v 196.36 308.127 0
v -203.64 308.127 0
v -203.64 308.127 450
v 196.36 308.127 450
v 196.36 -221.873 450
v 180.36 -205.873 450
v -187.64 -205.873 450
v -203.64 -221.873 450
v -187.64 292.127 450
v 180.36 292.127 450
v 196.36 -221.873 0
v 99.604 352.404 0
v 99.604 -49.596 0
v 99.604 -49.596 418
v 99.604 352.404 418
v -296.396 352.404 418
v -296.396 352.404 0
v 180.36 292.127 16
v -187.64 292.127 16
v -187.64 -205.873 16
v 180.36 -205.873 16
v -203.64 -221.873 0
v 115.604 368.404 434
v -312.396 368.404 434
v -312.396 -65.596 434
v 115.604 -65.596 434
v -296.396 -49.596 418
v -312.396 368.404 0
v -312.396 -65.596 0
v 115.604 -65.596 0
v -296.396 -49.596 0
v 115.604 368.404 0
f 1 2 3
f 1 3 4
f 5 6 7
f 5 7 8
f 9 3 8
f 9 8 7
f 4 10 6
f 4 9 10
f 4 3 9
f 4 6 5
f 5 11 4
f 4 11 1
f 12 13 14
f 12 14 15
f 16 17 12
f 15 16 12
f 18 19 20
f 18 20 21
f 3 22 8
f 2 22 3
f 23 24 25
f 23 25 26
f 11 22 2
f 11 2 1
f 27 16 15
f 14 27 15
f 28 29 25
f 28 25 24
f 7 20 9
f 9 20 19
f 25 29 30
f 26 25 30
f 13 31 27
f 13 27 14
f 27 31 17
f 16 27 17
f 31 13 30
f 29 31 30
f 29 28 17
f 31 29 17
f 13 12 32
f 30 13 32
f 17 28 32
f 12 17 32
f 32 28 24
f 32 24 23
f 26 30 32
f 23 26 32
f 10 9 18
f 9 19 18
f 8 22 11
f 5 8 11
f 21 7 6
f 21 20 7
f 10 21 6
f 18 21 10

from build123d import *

# Parameters (mm, degrees)
F0_W     = 400
F0_H     = 530
F2_DEPTH = 450
F3_T     = -16
F1_W     = 428
F1_H     = 434
F4_DEPTH = 434
F5_T     = -16


with BuildPart() as f2:
    # F0 (on Top) → F2 (new body)
    with BuildSketch(Plane.XY):
        with Locations((-3.6404564339, 43.1266156584)):
            Rectangle(F0_W, F0_H)
    extrude(amount=F2_DEPTH)

    # F3
    f3_openings = [f2.faces().sort_by_distance(p)[0] for p in [
        (-3.640456, 43.126616, 450),
    ]]
    offset(amount=F3_T, openings=f3_openings)


with BuildPart() as f4:
    # F1 (on face) → F4 (new body)
    with BuildSketch(Plane.XY):
        with Locations((-98.3959314227, 151.4040260927)):
            Rectangle(F1_W, F1_H)
    extrude(amount=F4_DEPTH)

    # F5
    f5_openings = [f4.faces().sort_by_distance(p)[0] for p in [
        (-98.395931, 151.404026, 0),
    ]]
    offset(amount=F5_T, openings=f5_openings)


solid = Compound([f2.part, f4.part])
